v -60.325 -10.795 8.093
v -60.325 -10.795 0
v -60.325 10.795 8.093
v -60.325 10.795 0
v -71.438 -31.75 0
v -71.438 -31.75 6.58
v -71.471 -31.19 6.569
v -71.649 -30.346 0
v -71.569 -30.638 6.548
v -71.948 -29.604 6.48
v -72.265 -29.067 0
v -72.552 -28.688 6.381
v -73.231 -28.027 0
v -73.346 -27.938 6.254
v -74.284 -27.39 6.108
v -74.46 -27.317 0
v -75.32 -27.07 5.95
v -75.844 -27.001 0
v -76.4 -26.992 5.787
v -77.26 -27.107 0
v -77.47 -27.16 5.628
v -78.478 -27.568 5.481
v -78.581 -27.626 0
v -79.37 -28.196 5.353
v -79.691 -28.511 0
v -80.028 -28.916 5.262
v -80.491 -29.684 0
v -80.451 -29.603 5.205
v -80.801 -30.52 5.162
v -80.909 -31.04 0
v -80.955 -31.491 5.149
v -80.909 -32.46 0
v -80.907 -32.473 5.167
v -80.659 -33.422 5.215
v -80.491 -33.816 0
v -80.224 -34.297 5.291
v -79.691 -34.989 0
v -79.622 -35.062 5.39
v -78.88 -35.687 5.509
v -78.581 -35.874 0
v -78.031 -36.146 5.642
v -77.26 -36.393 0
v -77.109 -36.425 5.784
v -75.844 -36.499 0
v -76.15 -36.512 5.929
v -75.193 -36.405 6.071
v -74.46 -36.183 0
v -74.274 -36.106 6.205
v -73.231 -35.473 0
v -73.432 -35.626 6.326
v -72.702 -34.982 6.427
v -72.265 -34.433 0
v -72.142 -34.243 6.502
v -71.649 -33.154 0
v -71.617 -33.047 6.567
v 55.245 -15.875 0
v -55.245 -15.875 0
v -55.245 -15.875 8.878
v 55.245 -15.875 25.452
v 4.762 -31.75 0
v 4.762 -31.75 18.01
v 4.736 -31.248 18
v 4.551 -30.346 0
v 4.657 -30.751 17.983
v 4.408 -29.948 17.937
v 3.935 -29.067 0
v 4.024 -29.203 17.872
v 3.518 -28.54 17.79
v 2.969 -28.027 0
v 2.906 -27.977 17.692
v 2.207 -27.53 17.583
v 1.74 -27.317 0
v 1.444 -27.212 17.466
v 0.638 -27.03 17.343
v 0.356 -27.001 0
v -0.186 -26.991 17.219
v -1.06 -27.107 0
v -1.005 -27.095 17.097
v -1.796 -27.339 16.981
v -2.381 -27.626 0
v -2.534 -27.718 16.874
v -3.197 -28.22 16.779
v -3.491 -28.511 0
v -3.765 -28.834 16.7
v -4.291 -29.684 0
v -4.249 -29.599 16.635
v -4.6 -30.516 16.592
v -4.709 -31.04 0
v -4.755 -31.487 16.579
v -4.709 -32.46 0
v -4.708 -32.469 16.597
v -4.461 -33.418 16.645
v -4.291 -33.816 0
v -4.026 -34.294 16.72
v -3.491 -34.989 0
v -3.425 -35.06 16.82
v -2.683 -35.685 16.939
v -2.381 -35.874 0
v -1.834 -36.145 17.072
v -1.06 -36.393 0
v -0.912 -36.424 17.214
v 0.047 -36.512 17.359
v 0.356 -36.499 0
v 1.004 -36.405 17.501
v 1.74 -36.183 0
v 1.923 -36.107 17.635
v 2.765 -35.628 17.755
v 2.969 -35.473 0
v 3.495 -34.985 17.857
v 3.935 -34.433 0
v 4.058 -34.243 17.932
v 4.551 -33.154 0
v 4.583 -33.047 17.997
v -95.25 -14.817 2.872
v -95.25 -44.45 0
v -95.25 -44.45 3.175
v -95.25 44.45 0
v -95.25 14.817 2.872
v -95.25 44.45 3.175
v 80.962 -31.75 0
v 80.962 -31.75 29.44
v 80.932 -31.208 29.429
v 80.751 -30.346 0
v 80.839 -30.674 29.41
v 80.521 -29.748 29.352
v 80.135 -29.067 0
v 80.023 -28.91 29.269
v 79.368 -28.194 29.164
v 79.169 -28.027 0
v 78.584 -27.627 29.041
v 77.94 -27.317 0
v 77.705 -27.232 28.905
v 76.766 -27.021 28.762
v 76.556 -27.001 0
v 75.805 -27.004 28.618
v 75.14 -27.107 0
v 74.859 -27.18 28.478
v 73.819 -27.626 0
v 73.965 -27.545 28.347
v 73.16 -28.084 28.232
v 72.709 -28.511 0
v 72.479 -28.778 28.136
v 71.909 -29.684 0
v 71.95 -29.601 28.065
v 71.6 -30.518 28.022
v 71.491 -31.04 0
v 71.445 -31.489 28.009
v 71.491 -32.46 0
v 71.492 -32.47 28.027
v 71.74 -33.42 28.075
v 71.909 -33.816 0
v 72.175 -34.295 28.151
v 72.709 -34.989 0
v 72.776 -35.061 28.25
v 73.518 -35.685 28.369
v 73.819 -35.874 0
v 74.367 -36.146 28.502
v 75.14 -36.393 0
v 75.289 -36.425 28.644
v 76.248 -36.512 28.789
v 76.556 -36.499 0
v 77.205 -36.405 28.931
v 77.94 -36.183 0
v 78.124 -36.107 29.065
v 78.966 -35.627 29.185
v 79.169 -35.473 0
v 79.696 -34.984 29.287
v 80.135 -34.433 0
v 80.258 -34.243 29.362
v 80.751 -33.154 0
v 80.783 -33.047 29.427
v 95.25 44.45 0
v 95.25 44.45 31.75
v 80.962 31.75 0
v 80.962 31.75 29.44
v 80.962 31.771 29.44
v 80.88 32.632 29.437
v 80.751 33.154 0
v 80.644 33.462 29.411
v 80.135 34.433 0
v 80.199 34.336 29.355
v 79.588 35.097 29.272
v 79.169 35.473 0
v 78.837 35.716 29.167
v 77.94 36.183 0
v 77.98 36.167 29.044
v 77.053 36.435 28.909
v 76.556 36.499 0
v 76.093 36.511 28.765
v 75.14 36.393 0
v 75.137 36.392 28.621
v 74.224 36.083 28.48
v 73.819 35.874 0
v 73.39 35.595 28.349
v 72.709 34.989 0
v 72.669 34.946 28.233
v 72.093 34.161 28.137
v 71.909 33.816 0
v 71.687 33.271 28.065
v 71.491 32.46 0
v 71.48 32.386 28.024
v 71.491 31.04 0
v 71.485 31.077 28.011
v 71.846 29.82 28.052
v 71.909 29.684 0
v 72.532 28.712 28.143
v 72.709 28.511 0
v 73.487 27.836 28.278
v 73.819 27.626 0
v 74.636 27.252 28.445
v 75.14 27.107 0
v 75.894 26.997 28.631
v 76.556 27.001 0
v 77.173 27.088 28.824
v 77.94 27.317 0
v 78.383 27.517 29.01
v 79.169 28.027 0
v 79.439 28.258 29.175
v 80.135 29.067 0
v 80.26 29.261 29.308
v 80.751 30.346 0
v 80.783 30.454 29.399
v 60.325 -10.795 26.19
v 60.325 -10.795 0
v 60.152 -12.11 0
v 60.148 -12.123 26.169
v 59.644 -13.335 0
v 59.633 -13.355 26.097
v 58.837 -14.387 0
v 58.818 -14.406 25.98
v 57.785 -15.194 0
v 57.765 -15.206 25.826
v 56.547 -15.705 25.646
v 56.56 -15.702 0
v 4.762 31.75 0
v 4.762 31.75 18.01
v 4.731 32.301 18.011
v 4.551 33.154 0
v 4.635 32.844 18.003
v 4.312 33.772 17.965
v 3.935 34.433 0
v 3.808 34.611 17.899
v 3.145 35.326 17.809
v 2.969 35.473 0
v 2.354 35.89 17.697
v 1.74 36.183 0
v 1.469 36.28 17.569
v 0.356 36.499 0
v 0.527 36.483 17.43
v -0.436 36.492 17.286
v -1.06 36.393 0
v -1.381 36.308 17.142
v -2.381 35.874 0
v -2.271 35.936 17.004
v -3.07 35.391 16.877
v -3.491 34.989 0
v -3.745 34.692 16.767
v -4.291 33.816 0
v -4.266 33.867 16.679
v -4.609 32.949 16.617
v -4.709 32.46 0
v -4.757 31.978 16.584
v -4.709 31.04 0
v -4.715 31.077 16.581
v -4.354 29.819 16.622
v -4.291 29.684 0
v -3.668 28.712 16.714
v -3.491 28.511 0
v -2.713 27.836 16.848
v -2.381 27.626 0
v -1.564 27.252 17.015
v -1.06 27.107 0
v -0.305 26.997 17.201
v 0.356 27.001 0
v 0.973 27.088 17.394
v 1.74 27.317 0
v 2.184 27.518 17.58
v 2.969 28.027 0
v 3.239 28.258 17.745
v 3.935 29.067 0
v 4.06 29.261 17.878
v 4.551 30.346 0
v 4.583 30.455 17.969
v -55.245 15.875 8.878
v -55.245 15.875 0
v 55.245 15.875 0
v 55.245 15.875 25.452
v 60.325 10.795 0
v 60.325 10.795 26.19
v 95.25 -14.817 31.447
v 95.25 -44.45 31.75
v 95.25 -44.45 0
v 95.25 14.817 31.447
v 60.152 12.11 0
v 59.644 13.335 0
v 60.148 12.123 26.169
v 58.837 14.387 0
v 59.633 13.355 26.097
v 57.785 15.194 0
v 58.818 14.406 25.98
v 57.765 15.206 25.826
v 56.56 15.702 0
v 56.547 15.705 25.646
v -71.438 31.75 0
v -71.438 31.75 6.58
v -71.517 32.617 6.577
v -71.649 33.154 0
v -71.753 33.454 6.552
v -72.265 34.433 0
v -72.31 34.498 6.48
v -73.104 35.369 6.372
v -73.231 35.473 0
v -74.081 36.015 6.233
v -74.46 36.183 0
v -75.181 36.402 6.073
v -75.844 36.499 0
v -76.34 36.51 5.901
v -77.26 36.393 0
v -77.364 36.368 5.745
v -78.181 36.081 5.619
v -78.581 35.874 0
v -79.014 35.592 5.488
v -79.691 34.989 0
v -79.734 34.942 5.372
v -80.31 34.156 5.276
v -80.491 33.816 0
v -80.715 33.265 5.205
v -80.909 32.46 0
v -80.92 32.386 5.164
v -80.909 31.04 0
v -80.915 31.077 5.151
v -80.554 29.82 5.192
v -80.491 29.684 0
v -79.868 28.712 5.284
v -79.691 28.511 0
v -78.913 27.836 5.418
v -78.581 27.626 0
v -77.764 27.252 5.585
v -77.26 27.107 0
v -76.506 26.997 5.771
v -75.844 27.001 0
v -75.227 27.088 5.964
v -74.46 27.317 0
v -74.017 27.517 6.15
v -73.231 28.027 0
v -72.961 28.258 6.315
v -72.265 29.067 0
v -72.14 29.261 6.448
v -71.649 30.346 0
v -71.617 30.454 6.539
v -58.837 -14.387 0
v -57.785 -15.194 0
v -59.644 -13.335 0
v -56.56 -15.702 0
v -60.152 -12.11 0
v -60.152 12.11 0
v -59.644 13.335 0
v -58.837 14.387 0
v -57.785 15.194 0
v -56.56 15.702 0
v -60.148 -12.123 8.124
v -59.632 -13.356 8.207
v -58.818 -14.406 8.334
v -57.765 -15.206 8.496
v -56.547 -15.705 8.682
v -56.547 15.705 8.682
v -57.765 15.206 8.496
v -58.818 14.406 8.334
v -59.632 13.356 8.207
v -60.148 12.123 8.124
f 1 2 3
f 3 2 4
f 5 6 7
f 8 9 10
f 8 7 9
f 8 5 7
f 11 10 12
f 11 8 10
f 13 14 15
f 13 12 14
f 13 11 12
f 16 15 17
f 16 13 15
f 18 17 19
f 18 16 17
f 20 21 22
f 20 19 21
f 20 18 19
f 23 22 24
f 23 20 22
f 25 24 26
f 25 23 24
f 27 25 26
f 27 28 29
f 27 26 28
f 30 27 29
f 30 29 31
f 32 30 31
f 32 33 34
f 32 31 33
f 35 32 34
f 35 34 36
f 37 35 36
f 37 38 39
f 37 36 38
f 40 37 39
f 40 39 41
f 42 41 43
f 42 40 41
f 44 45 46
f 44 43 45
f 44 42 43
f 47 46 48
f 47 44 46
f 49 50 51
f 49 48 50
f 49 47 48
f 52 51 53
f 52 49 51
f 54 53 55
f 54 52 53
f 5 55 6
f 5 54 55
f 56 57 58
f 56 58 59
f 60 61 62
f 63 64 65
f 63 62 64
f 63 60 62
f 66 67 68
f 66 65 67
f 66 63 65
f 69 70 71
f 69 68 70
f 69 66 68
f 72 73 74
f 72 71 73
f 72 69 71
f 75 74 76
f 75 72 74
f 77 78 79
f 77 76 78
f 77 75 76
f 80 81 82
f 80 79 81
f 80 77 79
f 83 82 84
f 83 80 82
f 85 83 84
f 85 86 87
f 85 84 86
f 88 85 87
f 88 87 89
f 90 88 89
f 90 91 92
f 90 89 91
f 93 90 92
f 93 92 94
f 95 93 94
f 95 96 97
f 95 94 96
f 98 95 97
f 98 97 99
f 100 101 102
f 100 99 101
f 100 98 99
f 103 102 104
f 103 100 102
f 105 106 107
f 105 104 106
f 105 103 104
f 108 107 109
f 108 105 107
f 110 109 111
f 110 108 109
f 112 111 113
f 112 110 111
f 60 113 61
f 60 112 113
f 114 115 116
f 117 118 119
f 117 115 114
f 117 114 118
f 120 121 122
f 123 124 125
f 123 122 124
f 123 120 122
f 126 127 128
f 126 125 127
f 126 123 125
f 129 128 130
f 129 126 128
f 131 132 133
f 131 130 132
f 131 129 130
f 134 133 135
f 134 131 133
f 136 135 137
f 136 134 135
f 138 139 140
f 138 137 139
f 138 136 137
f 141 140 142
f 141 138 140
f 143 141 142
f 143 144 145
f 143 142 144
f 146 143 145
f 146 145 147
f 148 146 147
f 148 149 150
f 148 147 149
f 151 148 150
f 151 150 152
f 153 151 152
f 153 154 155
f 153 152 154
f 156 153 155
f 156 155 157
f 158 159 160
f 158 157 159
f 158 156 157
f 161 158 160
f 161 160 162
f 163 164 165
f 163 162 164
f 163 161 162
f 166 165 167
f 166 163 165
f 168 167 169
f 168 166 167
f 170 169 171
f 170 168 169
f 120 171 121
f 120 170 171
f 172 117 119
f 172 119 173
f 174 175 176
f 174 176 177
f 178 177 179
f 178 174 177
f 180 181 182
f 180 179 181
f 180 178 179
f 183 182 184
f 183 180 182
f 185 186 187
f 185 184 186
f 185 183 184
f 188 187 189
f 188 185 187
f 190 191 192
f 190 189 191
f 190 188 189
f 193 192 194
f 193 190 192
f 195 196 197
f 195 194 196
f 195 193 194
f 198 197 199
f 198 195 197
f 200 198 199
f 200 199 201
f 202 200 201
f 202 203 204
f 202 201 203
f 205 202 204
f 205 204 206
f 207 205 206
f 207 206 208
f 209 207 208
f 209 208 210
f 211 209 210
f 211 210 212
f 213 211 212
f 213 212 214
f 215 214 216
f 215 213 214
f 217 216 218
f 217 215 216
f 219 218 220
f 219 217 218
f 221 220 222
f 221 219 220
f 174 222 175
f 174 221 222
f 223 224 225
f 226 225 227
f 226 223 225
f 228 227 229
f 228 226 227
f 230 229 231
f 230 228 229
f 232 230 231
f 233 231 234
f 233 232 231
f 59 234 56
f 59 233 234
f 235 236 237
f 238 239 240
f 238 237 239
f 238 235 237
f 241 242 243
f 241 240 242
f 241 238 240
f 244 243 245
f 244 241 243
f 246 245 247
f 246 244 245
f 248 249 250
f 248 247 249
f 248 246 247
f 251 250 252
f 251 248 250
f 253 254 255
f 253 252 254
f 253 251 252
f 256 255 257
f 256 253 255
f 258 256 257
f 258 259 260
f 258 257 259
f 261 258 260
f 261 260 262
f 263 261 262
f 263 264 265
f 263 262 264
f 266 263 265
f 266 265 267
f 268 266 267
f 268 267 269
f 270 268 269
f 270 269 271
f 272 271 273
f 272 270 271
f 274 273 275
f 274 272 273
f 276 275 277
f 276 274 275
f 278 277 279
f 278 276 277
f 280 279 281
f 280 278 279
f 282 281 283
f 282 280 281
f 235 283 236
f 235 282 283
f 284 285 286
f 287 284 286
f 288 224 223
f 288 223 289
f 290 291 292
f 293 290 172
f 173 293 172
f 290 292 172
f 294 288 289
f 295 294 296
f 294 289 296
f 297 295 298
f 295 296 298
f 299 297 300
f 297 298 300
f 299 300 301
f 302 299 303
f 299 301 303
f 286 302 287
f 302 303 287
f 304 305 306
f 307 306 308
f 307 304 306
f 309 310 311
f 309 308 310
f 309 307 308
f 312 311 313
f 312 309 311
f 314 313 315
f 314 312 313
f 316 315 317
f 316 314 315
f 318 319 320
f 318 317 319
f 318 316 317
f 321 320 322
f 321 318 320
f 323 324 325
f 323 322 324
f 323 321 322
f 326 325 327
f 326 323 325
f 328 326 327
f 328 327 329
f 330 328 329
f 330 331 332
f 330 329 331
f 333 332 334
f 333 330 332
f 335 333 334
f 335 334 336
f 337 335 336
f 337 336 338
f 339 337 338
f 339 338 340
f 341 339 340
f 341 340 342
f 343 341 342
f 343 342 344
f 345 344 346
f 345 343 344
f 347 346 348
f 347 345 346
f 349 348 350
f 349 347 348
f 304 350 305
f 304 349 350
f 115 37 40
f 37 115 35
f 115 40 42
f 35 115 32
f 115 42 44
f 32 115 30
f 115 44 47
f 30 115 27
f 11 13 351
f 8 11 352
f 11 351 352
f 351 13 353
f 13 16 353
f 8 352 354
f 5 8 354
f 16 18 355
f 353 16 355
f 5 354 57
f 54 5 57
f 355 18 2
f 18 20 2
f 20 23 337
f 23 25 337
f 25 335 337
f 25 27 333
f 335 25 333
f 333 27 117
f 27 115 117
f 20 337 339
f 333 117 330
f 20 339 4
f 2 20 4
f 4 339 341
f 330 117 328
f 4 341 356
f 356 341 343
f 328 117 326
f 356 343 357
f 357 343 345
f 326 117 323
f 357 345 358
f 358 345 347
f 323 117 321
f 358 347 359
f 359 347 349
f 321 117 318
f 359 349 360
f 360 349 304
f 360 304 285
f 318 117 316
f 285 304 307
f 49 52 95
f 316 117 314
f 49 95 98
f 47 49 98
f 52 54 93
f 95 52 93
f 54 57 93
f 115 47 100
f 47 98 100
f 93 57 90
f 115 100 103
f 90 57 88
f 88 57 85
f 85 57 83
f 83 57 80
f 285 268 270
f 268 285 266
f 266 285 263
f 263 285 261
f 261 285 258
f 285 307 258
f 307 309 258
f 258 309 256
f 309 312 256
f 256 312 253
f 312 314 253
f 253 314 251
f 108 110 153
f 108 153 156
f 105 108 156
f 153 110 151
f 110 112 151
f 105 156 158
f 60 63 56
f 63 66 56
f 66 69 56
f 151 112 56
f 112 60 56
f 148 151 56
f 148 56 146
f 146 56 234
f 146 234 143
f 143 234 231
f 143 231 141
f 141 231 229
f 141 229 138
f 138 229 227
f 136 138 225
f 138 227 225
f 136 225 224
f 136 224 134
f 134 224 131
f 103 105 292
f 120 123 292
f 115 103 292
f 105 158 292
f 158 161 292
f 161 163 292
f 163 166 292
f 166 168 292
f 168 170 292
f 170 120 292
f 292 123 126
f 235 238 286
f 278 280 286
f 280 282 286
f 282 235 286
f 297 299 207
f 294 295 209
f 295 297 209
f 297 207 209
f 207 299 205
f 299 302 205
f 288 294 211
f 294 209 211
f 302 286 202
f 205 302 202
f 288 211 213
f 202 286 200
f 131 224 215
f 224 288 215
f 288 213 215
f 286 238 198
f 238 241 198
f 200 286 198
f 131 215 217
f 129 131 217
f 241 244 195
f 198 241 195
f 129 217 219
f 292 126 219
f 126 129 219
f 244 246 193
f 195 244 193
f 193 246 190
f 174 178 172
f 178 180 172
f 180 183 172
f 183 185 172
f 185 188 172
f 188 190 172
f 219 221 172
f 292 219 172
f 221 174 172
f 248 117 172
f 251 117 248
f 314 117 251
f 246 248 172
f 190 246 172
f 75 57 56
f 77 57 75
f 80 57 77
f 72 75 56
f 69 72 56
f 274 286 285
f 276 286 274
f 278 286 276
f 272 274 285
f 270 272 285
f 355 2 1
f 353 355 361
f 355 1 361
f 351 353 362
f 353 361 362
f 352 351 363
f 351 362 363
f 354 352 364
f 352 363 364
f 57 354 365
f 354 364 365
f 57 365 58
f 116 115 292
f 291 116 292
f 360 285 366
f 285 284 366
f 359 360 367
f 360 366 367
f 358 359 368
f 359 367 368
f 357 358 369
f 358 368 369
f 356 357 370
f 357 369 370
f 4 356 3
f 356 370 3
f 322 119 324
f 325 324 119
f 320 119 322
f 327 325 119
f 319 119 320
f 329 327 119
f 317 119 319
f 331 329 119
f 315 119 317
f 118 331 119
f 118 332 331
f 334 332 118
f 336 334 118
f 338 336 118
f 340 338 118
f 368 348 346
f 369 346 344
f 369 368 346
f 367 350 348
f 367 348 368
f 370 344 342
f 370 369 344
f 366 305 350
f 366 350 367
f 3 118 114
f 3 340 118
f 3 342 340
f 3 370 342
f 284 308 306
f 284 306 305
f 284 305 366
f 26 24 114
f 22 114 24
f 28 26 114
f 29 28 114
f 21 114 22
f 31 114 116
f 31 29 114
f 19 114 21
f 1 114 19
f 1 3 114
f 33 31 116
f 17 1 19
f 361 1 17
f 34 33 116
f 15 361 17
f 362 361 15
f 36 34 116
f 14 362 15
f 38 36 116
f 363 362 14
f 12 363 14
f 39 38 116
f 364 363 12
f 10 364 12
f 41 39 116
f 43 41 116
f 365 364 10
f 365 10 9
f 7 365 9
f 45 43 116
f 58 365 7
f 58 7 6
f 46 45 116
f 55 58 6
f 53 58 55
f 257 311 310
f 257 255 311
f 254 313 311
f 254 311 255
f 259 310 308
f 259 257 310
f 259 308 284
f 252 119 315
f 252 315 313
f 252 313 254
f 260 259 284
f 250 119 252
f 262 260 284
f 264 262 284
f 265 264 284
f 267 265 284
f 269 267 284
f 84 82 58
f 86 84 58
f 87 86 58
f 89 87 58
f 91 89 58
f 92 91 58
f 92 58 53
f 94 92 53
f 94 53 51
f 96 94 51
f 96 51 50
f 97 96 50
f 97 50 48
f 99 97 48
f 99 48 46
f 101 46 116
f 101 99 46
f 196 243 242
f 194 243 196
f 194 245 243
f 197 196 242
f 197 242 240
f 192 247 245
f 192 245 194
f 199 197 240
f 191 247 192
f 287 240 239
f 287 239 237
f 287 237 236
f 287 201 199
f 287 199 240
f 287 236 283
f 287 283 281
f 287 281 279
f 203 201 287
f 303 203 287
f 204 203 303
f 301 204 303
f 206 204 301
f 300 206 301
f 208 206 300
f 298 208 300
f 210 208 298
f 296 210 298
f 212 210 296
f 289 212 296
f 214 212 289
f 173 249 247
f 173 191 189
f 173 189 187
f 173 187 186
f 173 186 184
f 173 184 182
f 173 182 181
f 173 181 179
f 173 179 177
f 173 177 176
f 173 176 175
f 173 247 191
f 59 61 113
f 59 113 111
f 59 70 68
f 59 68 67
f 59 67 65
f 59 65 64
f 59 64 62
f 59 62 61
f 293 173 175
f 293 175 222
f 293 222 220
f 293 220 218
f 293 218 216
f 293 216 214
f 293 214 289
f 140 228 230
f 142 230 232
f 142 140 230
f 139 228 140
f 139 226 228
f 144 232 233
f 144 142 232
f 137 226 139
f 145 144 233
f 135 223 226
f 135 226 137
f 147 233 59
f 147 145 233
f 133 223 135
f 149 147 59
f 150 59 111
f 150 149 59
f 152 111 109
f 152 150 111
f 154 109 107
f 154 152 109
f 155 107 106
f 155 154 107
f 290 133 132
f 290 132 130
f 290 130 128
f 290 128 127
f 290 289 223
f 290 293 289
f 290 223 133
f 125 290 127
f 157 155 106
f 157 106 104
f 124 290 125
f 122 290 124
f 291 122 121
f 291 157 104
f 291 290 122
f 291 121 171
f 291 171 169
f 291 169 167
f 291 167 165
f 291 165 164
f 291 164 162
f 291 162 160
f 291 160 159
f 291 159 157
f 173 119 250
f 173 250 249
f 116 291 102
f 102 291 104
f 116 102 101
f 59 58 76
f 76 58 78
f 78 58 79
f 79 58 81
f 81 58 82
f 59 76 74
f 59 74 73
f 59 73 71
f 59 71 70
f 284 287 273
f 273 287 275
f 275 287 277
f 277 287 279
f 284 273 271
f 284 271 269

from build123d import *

# Parameters (mm, degrees)
F0_W     = 190.5
F0_H     = 88.9
F0_R     = 4.7625
F0_W_2   = 120.65
F0_H_2   = 31.75
F1_DEPTH = 50.8
F3_DEPTH = 88.901
F5_R     = 2895.6
F4_R     = 2895.6
F7_R     = 5.08


with BuildPart() as f1:
    # F0 (on Top) → F1 (new body)
    with BuildSketch(Plane.XY):
        Rectangle(F0_W, F0_H)
        with Locations((-76.2, -31.75)):
            Circle(F0_R, mode=Mode.SUBTRACT)
        with Locations((0, -31.75)):
            Circle(F0_R, mode=Mode.SUBTRACT)
        with Locations((76.2, -31.75)):
            Circle(F0_R, mode=Mode.SUBTRACT)
        with Locations((-76.2, 31.75)):
            Circle(F0_R, mode=Mode.SUBTRACT)
        Rectangle(F0_W_2, F0_H_2, mode=Mode.SUBTRACT)
        with Locations((0, 31.75)):
            Circle(F0_R, mode=Mode.SUBTRACT)
        with Locations((76.2, 31.75)):
            Circle(F0_R, mode=Mode.SUBTRACT)
    extrude(amount=F1_DEPTH)

    # F2 (on face) → F3 (cut, through all)
    with BuildSketch(Plane.XZ.offset(44.45)):
        Polygon((-129.30572, 83.835296), (-95.25, 3.175), (95.25, 31.75), (118.781321, 86.451776), align=None)
    extrude(amount=-F3_DEPTH, mode=Mode.SUBTRACT)

    # F5 (on face) → F6 section 0
    with BuildSketch(Plane(origin=(-95.25, 0, 0), x_dir=(0, -1, 0), z_dir=(-1, 0, 0))):
        with Locations((0, 2898.433807)):
            Circle(F5_R)
    # F4 (on face) → F6 section 1
    with BuildSketch(Plane.YZ.offset(95.25)):
        with Locations((0, 2927.008807)):
            Circle(F4_R)
    loft(mode=Mode.SUBTRACT)

    # F7
    f7_edges = [f1.edges().sort_by_distance(p)[0] for p in [
        (60.325, 15.875, 13.106787),
        (60.325, -15.875, 13.106787),
        (-60.325, -15.875, 4.058037),
        (-60.325, 15.875, 4.058037),
    ]]
    fillet(f7_edges, radius=F7_R)


solid = f1.part
